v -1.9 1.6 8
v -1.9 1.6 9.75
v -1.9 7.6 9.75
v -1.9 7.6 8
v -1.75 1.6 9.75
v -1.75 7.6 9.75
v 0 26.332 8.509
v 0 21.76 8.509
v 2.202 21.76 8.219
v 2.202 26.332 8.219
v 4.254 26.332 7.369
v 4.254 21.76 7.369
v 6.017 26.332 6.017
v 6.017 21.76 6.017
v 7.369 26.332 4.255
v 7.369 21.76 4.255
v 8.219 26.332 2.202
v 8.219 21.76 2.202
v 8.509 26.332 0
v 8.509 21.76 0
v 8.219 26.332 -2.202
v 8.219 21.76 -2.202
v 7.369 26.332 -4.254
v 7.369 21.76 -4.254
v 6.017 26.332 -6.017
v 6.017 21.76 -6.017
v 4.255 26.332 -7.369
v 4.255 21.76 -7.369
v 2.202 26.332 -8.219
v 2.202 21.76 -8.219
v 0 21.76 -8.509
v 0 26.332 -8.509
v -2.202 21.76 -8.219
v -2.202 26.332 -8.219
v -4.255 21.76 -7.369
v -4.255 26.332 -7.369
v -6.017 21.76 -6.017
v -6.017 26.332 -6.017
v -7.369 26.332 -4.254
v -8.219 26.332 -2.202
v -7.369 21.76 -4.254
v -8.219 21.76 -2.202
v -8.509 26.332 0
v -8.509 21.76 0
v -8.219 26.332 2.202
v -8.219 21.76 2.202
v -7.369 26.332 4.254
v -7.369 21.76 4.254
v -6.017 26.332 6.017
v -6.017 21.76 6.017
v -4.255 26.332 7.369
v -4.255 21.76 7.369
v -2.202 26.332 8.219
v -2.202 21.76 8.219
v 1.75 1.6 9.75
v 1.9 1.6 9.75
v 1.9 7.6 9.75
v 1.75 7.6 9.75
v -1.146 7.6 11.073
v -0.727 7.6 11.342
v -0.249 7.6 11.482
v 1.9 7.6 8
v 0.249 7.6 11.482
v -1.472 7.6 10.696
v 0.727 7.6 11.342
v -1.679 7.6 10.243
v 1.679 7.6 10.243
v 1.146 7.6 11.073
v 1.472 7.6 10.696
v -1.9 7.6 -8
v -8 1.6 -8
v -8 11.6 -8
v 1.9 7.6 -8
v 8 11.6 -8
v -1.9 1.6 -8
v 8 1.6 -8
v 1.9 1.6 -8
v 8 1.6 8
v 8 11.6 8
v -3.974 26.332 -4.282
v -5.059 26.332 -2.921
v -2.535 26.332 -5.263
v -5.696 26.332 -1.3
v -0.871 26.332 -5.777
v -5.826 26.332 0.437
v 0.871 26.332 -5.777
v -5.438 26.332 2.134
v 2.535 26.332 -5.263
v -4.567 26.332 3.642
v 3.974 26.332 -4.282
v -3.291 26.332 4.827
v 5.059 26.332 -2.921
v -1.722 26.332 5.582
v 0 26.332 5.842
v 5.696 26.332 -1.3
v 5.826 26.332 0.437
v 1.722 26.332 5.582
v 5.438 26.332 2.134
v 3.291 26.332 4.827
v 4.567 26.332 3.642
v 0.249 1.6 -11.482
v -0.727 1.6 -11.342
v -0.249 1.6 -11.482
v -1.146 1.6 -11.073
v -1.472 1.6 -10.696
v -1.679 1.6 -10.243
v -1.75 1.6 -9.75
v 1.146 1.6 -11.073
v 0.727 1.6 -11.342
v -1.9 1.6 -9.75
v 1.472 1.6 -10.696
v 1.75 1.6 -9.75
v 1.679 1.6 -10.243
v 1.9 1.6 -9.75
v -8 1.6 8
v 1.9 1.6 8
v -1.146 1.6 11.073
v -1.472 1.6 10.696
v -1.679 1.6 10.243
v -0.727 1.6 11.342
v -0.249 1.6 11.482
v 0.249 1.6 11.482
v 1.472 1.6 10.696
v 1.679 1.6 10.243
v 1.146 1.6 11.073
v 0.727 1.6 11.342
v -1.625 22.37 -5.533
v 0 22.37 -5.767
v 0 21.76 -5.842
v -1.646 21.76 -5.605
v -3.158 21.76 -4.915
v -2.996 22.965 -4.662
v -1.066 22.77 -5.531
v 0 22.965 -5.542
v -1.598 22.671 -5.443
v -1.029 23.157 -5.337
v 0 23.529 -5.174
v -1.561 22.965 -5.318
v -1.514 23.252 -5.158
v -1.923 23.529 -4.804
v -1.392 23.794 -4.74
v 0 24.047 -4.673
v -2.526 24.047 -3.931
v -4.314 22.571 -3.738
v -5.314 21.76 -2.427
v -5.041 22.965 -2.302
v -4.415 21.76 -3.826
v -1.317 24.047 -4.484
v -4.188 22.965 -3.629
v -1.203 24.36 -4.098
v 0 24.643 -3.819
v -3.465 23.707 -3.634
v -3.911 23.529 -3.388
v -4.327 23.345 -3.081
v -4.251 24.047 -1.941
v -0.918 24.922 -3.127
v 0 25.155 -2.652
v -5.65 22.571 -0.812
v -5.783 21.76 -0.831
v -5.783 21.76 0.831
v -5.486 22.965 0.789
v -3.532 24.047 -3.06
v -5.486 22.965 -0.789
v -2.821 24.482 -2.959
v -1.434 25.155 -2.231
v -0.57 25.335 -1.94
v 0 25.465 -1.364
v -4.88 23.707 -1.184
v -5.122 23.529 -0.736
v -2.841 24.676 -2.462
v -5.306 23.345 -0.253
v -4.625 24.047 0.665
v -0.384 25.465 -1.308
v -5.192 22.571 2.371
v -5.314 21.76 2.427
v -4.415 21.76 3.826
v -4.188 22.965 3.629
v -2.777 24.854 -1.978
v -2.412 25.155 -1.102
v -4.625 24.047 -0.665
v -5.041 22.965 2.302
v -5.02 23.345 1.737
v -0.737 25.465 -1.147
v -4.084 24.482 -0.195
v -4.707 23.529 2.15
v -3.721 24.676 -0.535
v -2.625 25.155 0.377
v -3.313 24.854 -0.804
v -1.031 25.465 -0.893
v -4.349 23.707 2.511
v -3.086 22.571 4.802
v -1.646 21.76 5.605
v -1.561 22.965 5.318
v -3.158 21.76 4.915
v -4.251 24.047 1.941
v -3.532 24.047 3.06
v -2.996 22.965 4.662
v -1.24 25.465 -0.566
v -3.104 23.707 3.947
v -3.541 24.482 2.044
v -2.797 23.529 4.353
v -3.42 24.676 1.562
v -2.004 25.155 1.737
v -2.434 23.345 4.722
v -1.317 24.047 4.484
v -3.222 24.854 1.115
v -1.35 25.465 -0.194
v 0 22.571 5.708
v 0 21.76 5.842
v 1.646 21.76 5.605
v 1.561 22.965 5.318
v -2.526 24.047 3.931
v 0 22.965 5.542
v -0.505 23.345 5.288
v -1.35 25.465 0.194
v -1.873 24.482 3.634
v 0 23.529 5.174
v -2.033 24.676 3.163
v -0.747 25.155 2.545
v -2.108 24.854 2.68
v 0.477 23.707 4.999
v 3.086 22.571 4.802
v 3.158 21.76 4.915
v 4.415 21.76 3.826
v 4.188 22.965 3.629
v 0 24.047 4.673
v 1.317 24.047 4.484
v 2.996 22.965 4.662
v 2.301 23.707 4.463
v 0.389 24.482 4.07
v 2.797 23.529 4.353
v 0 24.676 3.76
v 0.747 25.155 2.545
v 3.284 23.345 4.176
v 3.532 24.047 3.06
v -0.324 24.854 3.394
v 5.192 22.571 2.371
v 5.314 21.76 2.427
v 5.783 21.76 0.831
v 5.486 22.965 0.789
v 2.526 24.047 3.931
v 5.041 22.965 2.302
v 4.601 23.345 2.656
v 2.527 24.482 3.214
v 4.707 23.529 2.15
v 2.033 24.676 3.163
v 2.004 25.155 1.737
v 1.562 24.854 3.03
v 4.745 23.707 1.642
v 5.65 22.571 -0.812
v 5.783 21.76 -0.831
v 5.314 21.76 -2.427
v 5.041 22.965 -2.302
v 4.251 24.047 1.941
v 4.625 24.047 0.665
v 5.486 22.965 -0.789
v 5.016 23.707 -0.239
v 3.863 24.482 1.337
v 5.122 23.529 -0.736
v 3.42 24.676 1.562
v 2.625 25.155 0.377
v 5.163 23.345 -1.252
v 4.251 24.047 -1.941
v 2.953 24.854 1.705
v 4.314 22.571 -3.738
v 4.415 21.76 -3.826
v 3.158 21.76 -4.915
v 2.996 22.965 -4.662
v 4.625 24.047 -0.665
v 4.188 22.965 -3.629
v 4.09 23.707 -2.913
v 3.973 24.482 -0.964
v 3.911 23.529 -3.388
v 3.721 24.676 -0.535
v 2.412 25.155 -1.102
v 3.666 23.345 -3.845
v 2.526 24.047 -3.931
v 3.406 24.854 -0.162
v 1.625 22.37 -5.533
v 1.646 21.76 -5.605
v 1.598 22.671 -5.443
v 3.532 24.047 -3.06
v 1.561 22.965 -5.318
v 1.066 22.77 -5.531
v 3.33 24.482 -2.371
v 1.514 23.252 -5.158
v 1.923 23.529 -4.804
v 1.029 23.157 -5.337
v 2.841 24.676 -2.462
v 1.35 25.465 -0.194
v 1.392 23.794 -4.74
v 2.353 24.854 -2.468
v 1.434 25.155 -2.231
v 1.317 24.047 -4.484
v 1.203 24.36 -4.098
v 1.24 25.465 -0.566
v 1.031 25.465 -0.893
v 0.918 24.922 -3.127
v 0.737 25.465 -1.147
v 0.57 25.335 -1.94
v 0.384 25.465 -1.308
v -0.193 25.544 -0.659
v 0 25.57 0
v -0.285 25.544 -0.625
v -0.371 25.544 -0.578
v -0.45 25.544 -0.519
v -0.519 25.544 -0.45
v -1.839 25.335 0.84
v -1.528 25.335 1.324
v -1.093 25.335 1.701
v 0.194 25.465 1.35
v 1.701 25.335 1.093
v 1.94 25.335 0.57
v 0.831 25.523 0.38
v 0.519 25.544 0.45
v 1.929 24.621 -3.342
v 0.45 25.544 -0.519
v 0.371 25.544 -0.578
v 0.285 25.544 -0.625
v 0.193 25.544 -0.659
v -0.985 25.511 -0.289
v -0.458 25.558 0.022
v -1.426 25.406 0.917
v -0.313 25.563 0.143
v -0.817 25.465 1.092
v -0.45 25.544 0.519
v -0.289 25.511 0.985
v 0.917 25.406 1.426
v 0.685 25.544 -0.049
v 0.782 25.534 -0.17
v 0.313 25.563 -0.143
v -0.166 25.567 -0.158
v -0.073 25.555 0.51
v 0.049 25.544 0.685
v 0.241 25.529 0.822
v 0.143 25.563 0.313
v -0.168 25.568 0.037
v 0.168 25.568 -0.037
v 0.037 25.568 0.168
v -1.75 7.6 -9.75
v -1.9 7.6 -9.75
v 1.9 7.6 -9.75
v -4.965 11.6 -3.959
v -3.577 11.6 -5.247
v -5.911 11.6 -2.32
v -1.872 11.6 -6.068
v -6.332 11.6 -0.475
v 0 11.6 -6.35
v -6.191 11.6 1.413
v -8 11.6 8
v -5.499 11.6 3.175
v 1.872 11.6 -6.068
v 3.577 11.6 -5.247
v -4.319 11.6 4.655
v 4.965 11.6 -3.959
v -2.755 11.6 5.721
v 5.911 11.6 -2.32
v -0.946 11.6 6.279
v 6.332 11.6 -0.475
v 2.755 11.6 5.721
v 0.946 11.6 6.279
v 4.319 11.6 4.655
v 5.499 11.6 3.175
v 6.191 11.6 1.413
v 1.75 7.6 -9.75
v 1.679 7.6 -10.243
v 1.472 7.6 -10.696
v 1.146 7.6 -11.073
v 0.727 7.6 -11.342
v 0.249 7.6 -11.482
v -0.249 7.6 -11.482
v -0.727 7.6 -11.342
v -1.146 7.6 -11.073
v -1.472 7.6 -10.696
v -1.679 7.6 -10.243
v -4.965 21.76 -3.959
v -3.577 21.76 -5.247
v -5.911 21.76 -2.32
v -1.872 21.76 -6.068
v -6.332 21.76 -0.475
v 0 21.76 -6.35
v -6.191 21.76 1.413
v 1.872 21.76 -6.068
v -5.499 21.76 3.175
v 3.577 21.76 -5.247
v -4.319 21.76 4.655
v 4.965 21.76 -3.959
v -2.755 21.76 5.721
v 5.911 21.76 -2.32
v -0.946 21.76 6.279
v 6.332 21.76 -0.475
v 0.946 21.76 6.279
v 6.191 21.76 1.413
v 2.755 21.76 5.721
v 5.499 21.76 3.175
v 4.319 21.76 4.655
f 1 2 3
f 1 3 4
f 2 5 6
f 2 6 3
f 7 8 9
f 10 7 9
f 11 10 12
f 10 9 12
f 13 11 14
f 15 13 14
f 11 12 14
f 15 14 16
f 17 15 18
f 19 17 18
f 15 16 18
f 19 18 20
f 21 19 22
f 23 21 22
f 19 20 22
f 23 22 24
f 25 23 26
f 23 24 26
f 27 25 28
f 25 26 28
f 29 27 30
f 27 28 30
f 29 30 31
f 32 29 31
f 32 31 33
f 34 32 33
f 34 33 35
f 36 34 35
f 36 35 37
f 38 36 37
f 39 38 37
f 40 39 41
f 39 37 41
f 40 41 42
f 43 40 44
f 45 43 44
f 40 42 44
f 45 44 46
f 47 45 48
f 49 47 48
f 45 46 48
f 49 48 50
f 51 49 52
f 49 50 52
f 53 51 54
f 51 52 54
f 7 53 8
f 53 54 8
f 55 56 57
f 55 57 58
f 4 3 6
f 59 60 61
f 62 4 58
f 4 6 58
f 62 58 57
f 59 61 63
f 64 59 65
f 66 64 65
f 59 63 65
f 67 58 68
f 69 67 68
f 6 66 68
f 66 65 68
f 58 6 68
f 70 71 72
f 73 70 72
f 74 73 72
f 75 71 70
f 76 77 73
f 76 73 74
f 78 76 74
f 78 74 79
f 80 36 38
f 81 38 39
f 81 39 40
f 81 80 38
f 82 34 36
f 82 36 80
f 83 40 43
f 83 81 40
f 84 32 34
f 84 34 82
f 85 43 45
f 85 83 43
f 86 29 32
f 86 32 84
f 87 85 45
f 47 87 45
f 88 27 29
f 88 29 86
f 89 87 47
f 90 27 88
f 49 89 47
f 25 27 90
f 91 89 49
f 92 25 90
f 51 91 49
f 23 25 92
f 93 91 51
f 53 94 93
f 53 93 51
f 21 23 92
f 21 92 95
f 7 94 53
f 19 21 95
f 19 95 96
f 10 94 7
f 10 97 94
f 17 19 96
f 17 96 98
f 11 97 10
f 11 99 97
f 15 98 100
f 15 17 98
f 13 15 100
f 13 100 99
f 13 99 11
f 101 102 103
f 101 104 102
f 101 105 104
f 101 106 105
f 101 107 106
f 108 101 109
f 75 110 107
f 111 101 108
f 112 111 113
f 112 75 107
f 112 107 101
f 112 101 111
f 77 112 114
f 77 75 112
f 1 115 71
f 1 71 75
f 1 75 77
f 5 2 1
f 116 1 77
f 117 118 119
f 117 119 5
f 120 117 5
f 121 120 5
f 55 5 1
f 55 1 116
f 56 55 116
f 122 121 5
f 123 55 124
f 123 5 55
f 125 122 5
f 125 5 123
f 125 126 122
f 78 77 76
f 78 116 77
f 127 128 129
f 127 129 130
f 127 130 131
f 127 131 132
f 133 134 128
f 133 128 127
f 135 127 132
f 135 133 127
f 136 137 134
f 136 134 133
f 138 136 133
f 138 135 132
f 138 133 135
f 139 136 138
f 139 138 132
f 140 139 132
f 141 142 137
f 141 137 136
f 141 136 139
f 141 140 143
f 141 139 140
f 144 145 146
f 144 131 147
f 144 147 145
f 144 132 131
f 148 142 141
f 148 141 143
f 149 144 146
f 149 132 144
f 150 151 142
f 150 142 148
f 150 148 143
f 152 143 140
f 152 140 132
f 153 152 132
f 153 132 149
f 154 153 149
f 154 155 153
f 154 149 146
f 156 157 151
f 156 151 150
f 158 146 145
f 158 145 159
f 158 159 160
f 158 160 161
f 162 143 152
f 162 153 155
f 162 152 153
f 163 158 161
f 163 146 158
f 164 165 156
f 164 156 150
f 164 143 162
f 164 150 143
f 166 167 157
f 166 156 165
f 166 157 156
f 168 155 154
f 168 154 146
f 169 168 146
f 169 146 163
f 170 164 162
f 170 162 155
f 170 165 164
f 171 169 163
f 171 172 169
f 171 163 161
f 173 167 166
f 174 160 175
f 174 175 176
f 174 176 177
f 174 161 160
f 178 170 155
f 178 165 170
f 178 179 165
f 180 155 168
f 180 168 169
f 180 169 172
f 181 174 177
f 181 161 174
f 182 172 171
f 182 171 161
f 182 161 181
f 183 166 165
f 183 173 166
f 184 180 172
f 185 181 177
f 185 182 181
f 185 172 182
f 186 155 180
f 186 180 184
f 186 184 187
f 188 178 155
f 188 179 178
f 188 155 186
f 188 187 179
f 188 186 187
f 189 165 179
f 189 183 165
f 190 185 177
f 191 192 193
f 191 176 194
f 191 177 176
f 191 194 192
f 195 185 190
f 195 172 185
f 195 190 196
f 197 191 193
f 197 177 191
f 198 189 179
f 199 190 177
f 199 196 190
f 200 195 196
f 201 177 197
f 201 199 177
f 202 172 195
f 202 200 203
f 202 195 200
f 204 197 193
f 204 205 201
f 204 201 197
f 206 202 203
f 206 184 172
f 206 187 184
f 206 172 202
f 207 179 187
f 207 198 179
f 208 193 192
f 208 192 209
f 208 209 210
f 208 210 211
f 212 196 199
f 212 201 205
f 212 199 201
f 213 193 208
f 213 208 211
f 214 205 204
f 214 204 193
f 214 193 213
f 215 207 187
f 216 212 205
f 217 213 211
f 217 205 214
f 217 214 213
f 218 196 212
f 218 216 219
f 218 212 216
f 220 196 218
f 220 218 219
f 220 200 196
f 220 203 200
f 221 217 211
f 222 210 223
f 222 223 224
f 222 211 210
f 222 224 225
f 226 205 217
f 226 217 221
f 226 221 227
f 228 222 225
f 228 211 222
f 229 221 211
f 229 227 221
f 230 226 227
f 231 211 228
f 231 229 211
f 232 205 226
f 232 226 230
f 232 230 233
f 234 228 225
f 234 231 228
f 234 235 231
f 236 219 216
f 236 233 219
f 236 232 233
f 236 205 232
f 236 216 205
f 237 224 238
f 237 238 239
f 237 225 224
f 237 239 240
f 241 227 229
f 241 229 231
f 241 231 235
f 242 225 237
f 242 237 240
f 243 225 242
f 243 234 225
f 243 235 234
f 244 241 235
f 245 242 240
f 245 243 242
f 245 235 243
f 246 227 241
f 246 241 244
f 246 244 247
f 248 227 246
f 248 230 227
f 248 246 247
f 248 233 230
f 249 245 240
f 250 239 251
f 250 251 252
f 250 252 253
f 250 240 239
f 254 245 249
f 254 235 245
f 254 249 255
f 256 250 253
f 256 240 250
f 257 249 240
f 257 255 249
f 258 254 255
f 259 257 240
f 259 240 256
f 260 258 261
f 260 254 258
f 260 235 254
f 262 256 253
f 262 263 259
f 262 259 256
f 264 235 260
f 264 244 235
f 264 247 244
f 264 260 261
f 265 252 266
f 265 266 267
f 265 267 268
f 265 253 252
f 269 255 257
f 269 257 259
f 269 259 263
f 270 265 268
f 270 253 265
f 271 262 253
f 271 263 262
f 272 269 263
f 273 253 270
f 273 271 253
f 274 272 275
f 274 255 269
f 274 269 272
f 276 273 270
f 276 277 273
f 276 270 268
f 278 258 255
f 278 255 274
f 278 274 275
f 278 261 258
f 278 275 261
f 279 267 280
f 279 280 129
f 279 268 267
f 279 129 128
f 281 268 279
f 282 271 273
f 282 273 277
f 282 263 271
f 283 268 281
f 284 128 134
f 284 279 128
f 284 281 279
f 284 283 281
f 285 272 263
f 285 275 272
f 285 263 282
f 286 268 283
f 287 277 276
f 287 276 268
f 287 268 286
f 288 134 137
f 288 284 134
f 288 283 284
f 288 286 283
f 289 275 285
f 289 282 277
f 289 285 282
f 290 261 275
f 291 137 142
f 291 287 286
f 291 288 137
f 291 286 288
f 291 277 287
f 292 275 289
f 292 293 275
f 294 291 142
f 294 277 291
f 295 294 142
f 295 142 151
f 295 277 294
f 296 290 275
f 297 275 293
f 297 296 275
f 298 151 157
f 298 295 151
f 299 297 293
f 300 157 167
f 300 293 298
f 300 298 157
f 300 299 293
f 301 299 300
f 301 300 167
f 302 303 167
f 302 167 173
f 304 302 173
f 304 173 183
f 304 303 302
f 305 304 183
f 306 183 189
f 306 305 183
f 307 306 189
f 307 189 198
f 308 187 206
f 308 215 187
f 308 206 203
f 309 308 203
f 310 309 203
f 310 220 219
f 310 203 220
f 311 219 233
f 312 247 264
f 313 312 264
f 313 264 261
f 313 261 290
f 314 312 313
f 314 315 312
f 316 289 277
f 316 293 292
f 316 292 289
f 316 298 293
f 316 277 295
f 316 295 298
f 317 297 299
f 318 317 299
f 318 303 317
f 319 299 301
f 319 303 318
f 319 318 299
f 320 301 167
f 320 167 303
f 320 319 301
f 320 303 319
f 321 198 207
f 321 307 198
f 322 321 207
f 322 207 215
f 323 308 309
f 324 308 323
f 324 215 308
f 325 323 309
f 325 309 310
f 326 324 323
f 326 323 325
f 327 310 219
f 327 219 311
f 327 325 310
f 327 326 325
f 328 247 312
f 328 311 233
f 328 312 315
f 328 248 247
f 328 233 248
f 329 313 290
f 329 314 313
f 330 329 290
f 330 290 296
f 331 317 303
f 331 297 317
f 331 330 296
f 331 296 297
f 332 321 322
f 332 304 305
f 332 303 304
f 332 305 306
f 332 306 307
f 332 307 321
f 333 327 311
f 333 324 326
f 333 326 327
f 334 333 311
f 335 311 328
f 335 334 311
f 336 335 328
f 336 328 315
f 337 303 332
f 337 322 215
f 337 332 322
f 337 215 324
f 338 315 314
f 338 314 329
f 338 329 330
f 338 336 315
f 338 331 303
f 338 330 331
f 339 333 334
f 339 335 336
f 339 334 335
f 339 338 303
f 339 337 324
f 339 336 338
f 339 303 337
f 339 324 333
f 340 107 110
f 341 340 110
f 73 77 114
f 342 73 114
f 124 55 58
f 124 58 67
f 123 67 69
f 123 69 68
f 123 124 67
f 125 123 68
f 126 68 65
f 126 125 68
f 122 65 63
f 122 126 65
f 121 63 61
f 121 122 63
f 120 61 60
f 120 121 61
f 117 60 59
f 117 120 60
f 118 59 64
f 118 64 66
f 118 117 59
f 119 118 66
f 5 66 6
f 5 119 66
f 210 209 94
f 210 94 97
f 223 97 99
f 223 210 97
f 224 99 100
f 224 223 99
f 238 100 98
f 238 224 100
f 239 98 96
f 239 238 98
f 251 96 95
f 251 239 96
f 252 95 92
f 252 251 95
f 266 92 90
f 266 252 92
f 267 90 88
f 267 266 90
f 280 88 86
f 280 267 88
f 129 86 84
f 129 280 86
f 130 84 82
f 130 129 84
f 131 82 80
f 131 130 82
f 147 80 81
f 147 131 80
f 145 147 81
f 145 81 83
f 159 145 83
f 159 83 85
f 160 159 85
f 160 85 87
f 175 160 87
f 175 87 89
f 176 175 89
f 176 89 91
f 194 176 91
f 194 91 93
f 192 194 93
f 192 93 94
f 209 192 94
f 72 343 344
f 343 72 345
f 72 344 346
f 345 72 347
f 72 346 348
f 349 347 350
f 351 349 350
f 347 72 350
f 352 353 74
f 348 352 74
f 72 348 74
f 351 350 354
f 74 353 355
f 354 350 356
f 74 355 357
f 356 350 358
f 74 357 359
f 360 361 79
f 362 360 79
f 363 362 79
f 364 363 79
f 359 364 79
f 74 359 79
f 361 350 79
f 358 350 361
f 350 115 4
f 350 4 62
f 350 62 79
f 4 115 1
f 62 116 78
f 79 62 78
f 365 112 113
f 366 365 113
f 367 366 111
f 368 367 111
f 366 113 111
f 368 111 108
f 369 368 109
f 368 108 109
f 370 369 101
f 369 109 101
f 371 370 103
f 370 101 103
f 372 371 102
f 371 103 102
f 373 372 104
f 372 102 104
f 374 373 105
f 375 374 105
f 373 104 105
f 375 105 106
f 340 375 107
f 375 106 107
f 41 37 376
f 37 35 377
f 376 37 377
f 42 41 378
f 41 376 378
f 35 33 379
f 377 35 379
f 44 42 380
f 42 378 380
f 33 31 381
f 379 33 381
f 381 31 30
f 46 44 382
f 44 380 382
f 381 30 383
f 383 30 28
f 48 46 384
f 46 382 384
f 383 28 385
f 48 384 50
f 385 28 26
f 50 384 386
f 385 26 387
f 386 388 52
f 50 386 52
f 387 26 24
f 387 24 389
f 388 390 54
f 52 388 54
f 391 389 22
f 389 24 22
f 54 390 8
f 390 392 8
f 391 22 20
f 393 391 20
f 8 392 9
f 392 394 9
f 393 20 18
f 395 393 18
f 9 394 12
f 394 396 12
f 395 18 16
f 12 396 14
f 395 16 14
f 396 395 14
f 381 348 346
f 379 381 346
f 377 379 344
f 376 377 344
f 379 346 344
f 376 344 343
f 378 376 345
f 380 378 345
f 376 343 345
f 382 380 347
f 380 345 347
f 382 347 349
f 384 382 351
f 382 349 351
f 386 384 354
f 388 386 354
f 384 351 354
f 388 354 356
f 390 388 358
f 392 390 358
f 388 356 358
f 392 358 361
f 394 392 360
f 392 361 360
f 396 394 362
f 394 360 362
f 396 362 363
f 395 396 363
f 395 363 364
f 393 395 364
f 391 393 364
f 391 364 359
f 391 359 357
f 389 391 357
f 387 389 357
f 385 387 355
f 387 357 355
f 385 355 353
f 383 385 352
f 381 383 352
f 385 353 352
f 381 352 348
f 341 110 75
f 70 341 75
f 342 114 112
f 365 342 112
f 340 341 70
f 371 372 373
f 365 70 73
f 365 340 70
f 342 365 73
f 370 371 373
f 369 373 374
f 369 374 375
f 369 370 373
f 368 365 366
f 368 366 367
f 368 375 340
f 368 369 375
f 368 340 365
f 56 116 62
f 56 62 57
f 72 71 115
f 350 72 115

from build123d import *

# Parameters (mm, degrees)
SKETCH1_W               = 16
SKETCH1_H               = 16
CCD_BASE_DEPTH          = 10
CCD_BASE_MOUNT_DEPTH    = 6
SKETCH5_R               = 6.35
LENSE_TUBE_DEPTH        = 10.16
SKETCH6_R               = 8.509
SKETCH6_R_2             = 5.842
LENSE_RIM_DEPTH         = 4.572
LENSE_GLASS_FACE_RADIUS = 5.842
LENSE_GLASS_HEIGHT      = 3.81


with BuildPart() as part:
    # Sketch1 → ccd_base (new body)
    with BuildSketch(Plane.XZ.offset(-1.6)):
        Rectangle(SKETCH1_W, SKETCH1_H)
    extrude(amount=-CCD_BASE_DEPTH)

    # Sketch2 → ccd_base_mount (add)
    with BuildSketch(Plane.XZ.offset(-1.6)):
        with BuildLine():
            Line((1.9, 9.75), (1.75, 9.75))
            ThreePointArc((1.75, 9.75), (0, 11.5), (-1.75, 9.75))
            Line((-1.75, 9.75), (-1.9, 9.75))
            Line((-1.9, 9.75), (-1.9, 8))
            Line((-1.9, 8), (1.9, 8))
            Line((1.9, 8), (1.9, 9.75))
        make_face()
    ccd_base_mount = extrude(amount=-CCD_BASE_MOUNT_DEPTH)

    # Mirror1: ccd_base_mount across plane
    add(ccd_base_mount.mirror(Plane.XY))

    # Sketch5 → lense_tube (add)
    with BuildSketch(Plane(origin=(0, 11.6, 0), x_dir=(1, 0, 0), z_dir=(0, 1, 0))):
        Circle(SKETCH5_R)
    extrude(amount=LENSE_TUBE_DEPTH)

    # Sketch6 → lense_rim (add)
    with BuildSketch(Plane(origin=(0, 21.76, 0), x_dir=(1, 0, 0), z_dir=(0, 1, 0))):
        Circle(SKETCH6_R)
        Circle(SKETCH6_R_2, mode=Mode.SUBTRACT)
    extrude(amount=LENSE_RIM_DEPTH)

    # lense_glass: an elliptical dome of height H over a round flat face of radius A is half a spheroid: the quarter ellipse of half axes A and H revolved about the face's axis
    with BuildSketch(Plane((0, 21.76, 0), x_dir=(0, 0, -1), z_dir=(1, 0, 0)), mode=Mode.PRIVATE) as lense_glass_quarter:
        Ellipse(LENSE_GLASS_FACE_RADIUS, LENSE_GLASS_HEIGHT)
        Rectangle(LENSE_GLASS_FACE_RADIUS, LENSE_GLASS_HEIGHT, align=(Align.MIN, Align.MIN), mode=Mode.INTERSECT)
    revolve(lense_glass_quarter.sketch, axis=Axis((0, 21.76, 0), (0, 1, 0)))


solid = part.part
